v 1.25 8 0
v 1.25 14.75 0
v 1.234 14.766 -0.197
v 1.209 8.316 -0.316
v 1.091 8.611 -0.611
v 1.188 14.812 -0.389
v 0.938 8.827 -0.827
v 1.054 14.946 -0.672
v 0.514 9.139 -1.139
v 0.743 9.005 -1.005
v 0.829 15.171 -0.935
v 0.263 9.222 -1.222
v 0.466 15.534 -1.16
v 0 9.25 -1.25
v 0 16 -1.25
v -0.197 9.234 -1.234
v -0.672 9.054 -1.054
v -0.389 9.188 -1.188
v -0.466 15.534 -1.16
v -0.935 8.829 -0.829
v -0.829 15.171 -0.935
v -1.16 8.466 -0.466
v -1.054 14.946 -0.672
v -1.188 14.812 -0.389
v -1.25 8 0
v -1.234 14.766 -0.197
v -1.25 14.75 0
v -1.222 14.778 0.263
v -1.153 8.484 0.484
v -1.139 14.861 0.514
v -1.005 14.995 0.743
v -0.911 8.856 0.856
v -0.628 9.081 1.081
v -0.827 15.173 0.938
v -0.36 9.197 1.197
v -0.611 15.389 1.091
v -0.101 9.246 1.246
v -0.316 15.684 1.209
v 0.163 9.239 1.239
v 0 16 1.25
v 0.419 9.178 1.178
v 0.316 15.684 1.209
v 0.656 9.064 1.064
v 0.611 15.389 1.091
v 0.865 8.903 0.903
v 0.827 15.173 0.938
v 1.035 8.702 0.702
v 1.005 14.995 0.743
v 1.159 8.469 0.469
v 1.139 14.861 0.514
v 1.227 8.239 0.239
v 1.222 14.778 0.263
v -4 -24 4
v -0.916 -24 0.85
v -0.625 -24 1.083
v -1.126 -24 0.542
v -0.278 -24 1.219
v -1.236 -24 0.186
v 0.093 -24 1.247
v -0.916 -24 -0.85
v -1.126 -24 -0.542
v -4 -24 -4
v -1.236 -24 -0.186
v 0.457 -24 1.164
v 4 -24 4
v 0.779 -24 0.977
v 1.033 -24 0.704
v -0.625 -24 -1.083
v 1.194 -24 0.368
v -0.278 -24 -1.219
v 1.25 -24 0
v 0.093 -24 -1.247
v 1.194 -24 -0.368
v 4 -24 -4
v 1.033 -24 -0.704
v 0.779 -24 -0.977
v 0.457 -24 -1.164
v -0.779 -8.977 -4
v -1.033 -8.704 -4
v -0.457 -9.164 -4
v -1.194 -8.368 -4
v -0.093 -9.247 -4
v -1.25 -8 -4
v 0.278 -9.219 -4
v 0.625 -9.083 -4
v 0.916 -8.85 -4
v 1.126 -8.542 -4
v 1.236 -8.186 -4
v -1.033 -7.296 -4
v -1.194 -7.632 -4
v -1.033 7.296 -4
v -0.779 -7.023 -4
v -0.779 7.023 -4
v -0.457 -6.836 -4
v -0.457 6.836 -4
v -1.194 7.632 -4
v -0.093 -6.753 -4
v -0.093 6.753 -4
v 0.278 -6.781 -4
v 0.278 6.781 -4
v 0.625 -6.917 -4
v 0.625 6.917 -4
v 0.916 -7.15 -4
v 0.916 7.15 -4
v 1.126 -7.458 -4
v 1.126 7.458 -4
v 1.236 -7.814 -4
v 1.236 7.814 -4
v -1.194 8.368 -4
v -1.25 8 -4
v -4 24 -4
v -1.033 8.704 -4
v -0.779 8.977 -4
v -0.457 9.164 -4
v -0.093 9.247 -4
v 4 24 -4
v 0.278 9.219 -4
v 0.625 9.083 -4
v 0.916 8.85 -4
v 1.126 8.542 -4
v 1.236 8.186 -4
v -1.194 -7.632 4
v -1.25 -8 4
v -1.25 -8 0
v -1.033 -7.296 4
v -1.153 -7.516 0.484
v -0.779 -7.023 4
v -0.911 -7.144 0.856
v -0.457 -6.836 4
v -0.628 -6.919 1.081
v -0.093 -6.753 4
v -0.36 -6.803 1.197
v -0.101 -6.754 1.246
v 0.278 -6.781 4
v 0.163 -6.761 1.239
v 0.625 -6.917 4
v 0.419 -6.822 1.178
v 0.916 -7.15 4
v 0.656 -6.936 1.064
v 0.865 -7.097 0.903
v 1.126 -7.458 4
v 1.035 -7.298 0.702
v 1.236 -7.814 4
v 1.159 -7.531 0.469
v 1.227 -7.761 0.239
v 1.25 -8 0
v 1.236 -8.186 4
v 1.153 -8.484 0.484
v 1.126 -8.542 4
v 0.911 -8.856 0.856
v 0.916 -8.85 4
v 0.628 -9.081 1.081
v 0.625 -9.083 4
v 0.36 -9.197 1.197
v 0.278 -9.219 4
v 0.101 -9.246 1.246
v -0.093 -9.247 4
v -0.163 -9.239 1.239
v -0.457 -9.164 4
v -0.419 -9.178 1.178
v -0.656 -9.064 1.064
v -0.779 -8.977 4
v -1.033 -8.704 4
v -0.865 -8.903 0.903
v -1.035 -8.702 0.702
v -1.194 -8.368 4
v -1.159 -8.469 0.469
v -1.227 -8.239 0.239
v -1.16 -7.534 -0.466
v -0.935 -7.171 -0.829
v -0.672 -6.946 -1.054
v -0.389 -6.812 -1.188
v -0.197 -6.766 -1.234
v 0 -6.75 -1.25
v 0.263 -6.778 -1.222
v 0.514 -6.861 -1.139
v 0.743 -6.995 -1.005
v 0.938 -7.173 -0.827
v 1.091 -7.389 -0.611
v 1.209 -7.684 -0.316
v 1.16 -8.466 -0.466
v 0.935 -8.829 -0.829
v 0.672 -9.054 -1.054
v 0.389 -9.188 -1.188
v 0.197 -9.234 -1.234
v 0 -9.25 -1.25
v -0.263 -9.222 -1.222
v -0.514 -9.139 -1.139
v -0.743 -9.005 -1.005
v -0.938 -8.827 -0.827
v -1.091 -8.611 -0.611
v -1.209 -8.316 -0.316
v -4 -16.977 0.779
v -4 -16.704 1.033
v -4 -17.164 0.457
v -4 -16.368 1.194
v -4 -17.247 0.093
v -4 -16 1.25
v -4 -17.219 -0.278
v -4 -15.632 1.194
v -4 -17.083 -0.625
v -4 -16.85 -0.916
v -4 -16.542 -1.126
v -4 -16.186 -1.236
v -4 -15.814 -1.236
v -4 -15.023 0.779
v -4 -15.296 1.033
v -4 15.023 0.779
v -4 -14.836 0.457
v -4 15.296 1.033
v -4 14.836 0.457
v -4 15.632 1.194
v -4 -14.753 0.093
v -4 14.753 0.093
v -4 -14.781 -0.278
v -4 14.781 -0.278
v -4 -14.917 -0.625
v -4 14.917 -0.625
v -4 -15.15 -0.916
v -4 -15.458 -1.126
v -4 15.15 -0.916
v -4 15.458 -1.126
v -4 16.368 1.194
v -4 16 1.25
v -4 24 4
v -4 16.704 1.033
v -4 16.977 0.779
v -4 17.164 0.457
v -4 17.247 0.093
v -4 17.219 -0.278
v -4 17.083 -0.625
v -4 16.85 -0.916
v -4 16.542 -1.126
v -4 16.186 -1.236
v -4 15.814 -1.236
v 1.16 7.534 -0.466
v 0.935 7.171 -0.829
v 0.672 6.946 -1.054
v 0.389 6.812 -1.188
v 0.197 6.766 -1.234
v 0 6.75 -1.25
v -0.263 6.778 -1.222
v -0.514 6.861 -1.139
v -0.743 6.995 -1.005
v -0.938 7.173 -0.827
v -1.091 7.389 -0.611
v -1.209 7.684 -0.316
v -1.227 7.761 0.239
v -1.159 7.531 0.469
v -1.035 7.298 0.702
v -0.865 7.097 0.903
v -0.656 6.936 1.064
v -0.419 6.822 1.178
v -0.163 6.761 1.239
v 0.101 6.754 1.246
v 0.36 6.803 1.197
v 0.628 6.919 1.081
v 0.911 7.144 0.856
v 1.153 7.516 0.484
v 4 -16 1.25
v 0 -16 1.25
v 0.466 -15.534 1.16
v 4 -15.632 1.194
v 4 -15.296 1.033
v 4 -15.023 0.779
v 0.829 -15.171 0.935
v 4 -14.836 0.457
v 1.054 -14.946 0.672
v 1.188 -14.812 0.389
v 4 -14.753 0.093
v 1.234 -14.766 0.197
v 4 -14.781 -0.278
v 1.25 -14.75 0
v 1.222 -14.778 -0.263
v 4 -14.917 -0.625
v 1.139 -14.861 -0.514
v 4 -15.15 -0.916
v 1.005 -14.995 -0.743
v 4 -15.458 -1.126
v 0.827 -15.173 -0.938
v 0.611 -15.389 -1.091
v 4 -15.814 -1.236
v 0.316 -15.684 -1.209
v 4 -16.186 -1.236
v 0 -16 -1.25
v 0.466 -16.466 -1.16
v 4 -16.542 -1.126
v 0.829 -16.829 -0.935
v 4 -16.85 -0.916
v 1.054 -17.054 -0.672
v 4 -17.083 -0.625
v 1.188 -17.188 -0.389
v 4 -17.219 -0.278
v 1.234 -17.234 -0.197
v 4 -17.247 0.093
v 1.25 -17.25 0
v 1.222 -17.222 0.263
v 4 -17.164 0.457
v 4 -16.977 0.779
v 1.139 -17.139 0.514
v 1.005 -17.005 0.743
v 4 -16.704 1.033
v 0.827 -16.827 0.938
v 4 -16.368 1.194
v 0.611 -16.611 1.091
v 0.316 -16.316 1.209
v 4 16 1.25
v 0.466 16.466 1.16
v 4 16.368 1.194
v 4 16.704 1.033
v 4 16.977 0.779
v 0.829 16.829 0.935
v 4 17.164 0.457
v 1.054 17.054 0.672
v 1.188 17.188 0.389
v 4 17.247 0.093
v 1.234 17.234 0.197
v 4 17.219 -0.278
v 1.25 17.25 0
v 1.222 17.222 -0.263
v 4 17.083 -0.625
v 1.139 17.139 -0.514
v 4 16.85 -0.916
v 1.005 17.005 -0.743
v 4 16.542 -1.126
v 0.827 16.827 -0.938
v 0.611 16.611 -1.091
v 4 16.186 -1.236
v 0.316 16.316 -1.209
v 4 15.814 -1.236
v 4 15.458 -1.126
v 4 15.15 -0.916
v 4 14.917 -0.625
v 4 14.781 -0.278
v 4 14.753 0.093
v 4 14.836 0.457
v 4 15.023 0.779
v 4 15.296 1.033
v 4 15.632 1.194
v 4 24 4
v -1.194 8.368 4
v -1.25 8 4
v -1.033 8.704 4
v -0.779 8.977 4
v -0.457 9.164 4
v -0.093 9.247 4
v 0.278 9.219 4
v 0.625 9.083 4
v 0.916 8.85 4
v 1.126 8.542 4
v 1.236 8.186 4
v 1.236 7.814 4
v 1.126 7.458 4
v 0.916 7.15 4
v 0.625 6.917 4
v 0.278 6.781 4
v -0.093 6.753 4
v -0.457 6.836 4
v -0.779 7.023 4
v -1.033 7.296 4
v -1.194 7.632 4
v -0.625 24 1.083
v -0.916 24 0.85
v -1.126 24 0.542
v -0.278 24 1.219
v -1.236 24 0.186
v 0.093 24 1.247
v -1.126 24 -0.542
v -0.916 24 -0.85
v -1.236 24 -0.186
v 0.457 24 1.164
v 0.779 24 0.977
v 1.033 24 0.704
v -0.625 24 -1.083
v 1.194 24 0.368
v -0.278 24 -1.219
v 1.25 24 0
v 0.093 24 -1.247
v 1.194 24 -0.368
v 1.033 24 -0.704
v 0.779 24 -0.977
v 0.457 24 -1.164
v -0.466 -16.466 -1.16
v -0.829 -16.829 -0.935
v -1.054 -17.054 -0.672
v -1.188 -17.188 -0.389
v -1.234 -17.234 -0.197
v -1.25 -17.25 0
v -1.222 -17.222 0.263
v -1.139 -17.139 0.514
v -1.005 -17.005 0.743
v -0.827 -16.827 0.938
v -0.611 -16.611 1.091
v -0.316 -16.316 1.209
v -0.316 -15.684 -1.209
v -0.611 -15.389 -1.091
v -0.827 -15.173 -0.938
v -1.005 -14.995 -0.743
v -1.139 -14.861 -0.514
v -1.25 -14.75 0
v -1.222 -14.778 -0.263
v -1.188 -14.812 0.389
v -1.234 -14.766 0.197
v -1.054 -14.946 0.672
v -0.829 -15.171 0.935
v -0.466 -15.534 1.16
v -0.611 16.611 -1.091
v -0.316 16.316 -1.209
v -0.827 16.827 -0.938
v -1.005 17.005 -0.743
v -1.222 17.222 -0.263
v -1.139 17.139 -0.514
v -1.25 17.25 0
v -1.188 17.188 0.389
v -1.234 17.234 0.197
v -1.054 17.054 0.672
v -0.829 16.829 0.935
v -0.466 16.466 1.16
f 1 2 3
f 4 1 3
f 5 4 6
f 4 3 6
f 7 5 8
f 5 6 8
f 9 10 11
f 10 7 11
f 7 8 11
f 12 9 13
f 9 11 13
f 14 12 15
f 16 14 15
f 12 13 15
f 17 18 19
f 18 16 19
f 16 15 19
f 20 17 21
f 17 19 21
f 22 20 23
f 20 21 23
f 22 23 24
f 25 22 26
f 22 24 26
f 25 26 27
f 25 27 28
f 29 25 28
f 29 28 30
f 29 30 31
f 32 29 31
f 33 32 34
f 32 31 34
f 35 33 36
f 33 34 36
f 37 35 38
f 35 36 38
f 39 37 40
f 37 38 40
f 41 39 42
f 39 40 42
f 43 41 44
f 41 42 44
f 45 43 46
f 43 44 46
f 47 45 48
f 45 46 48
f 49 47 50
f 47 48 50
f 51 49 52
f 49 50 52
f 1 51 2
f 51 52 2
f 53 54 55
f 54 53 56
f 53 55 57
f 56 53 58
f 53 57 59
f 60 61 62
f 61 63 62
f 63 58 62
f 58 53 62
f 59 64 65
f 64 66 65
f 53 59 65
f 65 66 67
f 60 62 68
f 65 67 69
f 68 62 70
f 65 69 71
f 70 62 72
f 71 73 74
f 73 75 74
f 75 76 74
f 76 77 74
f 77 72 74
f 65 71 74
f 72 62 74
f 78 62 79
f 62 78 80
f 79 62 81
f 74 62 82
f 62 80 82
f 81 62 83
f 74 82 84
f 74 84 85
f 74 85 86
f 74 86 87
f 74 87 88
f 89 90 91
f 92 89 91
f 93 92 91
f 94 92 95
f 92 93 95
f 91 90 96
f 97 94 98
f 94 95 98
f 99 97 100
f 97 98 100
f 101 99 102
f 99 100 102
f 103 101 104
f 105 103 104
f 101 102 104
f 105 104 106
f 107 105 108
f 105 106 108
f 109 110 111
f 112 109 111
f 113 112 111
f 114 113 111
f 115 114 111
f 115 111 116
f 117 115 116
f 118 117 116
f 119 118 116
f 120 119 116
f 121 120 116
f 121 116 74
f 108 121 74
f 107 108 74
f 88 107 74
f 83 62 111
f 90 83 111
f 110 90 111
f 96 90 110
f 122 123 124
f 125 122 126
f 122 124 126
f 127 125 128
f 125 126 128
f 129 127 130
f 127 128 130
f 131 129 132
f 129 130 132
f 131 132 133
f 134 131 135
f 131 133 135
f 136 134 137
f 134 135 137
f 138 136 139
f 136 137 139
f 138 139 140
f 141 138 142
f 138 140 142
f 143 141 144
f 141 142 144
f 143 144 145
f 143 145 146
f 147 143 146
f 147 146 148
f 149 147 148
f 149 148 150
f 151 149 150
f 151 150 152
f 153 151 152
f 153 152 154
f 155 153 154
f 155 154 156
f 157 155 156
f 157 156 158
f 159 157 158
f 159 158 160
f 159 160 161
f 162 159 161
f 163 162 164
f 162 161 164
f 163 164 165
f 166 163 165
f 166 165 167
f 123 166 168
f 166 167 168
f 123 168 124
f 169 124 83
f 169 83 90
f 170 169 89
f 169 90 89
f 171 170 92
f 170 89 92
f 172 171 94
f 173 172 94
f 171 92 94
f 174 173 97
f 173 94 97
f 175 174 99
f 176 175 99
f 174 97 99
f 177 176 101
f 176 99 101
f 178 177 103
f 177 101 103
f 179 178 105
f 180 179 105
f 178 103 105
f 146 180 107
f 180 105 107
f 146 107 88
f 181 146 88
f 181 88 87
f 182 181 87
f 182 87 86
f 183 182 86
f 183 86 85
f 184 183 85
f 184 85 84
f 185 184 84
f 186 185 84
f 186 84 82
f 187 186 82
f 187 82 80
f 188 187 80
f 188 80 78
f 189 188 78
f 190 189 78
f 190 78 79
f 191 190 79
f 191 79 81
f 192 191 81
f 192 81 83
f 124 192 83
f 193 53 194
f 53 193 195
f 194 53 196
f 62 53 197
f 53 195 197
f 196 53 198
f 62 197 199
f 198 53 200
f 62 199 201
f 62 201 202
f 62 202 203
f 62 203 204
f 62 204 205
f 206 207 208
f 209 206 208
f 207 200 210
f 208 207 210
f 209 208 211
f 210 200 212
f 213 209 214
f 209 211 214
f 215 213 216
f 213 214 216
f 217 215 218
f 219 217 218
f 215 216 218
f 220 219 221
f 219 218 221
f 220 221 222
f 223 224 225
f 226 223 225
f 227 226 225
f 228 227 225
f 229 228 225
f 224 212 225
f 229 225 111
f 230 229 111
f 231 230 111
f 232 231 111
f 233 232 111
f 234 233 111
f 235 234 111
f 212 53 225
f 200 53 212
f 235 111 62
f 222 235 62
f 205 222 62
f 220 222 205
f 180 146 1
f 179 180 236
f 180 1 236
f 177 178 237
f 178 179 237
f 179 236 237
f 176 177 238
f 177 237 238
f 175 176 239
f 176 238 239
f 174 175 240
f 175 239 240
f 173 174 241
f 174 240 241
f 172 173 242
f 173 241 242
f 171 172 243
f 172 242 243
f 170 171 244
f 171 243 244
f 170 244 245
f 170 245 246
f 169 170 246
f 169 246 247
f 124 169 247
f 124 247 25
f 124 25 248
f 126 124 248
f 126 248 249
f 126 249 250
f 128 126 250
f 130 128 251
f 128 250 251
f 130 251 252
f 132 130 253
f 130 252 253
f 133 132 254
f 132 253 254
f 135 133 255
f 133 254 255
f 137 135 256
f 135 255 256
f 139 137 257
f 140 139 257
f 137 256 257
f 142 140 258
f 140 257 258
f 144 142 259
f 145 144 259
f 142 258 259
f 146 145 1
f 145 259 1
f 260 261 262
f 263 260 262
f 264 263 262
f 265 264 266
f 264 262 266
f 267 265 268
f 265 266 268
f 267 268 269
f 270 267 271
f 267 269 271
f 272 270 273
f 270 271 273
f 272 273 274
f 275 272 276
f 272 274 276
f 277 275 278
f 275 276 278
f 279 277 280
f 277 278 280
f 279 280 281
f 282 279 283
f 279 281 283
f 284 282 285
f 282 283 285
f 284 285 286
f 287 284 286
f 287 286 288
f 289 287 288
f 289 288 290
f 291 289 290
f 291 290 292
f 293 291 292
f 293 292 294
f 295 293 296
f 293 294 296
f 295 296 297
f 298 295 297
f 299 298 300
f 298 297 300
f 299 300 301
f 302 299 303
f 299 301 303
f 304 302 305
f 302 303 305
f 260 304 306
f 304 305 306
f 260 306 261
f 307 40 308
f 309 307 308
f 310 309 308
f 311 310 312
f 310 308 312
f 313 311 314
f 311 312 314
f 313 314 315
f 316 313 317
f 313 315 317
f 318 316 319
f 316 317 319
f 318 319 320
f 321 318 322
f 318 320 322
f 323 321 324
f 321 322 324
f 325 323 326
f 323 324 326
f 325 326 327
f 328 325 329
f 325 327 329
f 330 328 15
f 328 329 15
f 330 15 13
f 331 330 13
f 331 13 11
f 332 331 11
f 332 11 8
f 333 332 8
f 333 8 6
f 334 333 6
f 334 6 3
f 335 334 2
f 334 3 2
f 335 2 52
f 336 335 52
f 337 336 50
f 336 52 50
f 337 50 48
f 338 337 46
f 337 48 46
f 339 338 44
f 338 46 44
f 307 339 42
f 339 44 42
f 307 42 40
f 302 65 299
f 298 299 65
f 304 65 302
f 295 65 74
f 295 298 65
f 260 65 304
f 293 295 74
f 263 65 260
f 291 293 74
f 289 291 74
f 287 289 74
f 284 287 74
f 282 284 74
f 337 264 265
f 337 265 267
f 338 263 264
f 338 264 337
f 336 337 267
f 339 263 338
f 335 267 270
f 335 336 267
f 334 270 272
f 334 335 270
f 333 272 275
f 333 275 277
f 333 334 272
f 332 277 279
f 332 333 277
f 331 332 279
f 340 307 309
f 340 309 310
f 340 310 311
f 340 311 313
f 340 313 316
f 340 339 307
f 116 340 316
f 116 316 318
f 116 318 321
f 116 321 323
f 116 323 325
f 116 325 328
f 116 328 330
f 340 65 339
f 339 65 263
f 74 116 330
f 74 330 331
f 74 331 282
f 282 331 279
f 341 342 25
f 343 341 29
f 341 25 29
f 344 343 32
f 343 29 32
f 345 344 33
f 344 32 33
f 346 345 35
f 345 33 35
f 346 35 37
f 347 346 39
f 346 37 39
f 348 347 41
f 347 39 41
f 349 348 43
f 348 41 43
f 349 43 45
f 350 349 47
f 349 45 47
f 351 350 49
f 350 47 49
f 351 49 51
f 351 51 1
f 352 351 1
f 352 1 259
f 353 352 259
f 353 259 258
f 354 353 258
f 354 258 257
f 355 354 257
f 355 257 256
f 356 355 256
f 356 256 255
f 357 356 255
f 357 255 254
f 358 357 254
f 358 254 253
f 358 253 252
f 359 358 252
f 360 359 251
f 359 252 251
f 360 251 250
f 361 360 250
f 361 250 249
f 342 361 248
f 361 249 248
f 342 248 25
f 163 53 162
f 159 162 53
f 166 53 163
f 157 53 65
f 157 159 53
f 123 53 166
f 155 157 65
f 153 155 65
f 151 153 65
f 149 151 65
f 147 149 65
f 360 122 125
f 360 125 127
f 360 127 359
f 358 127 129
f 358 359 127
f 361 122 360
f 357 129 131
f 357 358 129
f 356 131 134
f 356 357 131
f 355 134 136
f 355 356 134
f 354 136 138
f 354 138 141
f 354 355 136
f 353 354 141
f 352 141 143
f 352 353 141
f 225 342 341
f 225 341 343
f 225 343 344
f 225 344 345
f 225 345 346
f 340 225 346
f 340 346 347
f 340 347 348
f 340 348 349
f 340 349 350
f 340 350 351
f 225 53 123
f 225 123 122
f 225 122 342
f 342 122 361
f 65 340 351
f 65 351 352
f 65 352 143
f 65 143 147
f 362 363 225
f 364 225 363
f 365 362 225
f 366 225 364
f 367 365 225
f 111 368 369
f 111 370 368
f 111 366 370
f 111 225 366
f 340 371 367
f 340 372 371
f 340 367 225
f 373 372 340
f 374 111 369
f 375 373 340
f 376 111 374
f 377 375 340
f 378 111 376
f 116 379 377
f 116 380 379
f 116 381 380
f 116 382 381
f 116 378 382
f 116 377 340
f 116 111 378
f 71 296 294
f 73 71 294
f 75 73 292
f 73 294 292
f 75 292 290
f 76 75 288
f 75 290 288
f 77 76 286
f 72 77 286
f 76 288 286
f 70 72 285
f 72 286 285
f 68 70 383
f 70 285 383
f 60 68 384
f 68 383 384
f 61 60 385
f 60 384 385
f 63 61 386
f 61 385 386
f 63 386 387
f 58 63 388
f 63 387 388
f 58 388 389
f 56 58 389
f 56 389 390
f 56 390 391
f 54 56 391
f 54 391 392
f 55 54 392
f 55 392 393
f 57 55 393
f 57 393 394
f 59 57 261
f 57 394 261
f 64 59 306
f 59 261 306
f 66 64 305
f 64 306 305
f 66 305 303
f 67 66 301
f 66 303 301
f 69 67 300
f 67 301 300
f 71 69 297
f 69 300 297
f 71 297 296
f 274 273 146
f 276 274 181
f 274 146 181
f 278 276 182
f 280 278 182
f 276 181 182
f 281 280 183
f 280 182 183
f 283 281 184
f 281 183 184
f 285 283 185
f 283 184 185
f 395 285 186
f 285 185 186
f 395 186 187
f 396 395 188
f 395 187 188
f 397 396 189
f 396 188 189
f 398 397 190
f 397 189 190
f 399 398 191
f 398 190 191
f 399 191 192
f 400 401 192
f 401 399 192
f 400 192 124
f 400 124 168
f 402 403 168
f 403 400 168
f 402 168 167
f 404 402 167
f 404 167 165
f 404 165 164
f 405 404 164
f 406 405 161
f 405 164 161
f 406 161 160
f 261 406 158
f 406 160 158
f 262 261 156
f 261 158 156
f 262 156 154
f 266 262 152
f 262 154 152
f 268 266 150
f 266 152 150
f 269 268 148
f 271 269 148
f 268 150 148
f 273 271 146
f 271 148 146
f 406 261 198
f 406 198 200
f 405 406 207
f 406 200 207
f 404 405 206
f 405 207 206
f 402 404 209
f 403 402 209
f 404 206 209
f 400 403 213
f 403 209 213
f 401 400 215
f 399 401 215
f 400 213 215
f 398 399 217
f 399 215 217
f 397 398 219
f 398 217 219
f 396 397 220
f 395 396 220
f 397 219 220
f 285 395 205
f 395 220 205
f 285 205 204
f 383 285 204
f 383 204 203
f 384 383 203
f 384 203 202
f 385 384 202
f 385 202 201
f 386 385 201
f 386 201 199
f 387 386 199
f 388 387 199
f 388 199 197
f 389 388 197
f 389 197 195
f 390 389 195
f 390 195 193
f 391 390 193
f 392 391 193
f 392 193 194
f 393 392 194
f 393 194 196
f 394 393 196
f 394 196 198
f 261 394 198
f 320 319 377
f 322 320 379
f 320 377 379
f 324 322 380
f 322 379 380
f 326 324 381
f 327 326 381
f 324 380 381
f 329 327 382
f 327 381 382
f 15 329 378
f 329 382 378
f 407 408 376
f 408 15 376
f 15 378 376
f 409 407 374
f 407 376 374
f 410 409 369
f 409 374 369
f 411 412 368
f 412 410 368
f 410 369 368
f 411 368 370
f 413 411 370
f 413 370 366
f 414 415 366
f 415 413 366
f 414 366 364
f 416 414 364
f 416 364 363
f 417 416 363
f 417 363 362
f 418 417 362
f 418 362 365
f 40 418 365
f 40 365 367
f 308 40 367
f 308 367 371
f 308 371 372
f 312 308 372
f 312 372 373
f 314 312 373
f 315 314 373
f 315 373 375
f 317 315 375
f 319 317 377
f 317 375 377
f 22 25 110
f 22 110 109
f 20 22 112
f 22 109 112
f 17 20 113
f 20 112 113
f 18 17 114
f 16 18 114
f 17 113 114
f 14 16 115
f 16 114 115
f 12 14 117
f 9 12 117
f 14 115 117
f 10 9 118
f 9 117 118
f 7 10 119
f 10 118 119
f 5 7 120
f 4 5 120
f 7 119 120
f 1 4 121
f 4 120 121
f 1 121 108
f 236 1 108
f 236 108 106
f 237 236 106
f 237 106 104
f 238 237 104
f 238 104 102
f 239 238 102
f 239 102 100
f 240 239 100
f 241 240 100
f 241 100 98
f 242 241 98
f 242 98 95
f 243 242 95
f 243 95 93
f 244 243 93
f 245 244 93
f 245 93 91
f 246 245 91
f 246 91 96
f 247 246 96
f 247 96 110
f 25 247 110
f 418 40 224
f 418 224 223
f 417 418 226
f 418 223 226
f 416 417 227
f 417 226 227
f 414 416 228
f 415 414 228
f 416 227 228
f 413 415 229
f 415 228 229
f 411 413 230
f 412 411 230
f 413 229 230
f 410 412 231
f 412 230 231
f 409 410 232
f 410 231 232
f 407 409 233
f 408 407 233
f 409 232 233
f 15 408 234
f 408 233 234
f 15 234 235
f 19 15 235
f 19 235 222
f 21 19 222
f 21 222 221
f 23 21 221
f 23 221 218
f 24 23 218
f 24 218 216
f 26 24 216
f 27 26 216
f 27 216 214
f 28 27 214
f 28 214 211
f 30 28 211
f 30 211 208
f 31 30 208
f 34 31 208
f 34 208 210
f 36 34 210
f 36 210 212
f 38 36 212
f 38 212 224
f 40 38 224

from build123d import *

# Parameters (mm, degrees)
SKETCH_1_W         = 8
SKETCH_1_H         = 8
EXTRUDE_1_DEPTH    = 24
HOLE_WIZARD_M3_1_D = 2.5
HOLE_WIZARD_M3_2_D = 2.5
HOLE_WIZARD_M3_3_D = 2.5


with BuildPart() as part:
    # 草图1 → 凸台-拉伸1 (new, symmetric)
    with BuildSketch(Plane(origin=(0, 0, 0), x_dir=(1, 0, 0), z_dir=(0, 1, 0))):
        Rectangle(SKETCH_1_W, SKETCH_1_H)
    extrude(amount=EXTRUDE_1_DEPTH, both=True)

    # M3 螺纹孔1 (through all)
    with Locations(Plane.XY.offset(4)):
        with Locations((0, 8), (0, -8)):
            Hole(HOLE_WIZARD_M3_1_D / 2)

    # M3 螺纹孔2 (through all)
    with Locations(Plane(origin=(4, 0, 0), x_dir=(0, 0, -1), z_dir=(1, 0, 0))):
        with Locations((0, 16), (0, -16)):
            Hole(HOLE_WIZARD_M3_2_D / 2)

    # M3 螺纹孔3 (through all)
    with Locations(Plane(origin=(0, -24, 0), x_dir=(-1, 0, 0), z_dir=(0, -1, 0))):
        with Locations((0, 0)):
            Hole(HOLE_WIZARD_M3_3_D / 2)


solid = part.part
